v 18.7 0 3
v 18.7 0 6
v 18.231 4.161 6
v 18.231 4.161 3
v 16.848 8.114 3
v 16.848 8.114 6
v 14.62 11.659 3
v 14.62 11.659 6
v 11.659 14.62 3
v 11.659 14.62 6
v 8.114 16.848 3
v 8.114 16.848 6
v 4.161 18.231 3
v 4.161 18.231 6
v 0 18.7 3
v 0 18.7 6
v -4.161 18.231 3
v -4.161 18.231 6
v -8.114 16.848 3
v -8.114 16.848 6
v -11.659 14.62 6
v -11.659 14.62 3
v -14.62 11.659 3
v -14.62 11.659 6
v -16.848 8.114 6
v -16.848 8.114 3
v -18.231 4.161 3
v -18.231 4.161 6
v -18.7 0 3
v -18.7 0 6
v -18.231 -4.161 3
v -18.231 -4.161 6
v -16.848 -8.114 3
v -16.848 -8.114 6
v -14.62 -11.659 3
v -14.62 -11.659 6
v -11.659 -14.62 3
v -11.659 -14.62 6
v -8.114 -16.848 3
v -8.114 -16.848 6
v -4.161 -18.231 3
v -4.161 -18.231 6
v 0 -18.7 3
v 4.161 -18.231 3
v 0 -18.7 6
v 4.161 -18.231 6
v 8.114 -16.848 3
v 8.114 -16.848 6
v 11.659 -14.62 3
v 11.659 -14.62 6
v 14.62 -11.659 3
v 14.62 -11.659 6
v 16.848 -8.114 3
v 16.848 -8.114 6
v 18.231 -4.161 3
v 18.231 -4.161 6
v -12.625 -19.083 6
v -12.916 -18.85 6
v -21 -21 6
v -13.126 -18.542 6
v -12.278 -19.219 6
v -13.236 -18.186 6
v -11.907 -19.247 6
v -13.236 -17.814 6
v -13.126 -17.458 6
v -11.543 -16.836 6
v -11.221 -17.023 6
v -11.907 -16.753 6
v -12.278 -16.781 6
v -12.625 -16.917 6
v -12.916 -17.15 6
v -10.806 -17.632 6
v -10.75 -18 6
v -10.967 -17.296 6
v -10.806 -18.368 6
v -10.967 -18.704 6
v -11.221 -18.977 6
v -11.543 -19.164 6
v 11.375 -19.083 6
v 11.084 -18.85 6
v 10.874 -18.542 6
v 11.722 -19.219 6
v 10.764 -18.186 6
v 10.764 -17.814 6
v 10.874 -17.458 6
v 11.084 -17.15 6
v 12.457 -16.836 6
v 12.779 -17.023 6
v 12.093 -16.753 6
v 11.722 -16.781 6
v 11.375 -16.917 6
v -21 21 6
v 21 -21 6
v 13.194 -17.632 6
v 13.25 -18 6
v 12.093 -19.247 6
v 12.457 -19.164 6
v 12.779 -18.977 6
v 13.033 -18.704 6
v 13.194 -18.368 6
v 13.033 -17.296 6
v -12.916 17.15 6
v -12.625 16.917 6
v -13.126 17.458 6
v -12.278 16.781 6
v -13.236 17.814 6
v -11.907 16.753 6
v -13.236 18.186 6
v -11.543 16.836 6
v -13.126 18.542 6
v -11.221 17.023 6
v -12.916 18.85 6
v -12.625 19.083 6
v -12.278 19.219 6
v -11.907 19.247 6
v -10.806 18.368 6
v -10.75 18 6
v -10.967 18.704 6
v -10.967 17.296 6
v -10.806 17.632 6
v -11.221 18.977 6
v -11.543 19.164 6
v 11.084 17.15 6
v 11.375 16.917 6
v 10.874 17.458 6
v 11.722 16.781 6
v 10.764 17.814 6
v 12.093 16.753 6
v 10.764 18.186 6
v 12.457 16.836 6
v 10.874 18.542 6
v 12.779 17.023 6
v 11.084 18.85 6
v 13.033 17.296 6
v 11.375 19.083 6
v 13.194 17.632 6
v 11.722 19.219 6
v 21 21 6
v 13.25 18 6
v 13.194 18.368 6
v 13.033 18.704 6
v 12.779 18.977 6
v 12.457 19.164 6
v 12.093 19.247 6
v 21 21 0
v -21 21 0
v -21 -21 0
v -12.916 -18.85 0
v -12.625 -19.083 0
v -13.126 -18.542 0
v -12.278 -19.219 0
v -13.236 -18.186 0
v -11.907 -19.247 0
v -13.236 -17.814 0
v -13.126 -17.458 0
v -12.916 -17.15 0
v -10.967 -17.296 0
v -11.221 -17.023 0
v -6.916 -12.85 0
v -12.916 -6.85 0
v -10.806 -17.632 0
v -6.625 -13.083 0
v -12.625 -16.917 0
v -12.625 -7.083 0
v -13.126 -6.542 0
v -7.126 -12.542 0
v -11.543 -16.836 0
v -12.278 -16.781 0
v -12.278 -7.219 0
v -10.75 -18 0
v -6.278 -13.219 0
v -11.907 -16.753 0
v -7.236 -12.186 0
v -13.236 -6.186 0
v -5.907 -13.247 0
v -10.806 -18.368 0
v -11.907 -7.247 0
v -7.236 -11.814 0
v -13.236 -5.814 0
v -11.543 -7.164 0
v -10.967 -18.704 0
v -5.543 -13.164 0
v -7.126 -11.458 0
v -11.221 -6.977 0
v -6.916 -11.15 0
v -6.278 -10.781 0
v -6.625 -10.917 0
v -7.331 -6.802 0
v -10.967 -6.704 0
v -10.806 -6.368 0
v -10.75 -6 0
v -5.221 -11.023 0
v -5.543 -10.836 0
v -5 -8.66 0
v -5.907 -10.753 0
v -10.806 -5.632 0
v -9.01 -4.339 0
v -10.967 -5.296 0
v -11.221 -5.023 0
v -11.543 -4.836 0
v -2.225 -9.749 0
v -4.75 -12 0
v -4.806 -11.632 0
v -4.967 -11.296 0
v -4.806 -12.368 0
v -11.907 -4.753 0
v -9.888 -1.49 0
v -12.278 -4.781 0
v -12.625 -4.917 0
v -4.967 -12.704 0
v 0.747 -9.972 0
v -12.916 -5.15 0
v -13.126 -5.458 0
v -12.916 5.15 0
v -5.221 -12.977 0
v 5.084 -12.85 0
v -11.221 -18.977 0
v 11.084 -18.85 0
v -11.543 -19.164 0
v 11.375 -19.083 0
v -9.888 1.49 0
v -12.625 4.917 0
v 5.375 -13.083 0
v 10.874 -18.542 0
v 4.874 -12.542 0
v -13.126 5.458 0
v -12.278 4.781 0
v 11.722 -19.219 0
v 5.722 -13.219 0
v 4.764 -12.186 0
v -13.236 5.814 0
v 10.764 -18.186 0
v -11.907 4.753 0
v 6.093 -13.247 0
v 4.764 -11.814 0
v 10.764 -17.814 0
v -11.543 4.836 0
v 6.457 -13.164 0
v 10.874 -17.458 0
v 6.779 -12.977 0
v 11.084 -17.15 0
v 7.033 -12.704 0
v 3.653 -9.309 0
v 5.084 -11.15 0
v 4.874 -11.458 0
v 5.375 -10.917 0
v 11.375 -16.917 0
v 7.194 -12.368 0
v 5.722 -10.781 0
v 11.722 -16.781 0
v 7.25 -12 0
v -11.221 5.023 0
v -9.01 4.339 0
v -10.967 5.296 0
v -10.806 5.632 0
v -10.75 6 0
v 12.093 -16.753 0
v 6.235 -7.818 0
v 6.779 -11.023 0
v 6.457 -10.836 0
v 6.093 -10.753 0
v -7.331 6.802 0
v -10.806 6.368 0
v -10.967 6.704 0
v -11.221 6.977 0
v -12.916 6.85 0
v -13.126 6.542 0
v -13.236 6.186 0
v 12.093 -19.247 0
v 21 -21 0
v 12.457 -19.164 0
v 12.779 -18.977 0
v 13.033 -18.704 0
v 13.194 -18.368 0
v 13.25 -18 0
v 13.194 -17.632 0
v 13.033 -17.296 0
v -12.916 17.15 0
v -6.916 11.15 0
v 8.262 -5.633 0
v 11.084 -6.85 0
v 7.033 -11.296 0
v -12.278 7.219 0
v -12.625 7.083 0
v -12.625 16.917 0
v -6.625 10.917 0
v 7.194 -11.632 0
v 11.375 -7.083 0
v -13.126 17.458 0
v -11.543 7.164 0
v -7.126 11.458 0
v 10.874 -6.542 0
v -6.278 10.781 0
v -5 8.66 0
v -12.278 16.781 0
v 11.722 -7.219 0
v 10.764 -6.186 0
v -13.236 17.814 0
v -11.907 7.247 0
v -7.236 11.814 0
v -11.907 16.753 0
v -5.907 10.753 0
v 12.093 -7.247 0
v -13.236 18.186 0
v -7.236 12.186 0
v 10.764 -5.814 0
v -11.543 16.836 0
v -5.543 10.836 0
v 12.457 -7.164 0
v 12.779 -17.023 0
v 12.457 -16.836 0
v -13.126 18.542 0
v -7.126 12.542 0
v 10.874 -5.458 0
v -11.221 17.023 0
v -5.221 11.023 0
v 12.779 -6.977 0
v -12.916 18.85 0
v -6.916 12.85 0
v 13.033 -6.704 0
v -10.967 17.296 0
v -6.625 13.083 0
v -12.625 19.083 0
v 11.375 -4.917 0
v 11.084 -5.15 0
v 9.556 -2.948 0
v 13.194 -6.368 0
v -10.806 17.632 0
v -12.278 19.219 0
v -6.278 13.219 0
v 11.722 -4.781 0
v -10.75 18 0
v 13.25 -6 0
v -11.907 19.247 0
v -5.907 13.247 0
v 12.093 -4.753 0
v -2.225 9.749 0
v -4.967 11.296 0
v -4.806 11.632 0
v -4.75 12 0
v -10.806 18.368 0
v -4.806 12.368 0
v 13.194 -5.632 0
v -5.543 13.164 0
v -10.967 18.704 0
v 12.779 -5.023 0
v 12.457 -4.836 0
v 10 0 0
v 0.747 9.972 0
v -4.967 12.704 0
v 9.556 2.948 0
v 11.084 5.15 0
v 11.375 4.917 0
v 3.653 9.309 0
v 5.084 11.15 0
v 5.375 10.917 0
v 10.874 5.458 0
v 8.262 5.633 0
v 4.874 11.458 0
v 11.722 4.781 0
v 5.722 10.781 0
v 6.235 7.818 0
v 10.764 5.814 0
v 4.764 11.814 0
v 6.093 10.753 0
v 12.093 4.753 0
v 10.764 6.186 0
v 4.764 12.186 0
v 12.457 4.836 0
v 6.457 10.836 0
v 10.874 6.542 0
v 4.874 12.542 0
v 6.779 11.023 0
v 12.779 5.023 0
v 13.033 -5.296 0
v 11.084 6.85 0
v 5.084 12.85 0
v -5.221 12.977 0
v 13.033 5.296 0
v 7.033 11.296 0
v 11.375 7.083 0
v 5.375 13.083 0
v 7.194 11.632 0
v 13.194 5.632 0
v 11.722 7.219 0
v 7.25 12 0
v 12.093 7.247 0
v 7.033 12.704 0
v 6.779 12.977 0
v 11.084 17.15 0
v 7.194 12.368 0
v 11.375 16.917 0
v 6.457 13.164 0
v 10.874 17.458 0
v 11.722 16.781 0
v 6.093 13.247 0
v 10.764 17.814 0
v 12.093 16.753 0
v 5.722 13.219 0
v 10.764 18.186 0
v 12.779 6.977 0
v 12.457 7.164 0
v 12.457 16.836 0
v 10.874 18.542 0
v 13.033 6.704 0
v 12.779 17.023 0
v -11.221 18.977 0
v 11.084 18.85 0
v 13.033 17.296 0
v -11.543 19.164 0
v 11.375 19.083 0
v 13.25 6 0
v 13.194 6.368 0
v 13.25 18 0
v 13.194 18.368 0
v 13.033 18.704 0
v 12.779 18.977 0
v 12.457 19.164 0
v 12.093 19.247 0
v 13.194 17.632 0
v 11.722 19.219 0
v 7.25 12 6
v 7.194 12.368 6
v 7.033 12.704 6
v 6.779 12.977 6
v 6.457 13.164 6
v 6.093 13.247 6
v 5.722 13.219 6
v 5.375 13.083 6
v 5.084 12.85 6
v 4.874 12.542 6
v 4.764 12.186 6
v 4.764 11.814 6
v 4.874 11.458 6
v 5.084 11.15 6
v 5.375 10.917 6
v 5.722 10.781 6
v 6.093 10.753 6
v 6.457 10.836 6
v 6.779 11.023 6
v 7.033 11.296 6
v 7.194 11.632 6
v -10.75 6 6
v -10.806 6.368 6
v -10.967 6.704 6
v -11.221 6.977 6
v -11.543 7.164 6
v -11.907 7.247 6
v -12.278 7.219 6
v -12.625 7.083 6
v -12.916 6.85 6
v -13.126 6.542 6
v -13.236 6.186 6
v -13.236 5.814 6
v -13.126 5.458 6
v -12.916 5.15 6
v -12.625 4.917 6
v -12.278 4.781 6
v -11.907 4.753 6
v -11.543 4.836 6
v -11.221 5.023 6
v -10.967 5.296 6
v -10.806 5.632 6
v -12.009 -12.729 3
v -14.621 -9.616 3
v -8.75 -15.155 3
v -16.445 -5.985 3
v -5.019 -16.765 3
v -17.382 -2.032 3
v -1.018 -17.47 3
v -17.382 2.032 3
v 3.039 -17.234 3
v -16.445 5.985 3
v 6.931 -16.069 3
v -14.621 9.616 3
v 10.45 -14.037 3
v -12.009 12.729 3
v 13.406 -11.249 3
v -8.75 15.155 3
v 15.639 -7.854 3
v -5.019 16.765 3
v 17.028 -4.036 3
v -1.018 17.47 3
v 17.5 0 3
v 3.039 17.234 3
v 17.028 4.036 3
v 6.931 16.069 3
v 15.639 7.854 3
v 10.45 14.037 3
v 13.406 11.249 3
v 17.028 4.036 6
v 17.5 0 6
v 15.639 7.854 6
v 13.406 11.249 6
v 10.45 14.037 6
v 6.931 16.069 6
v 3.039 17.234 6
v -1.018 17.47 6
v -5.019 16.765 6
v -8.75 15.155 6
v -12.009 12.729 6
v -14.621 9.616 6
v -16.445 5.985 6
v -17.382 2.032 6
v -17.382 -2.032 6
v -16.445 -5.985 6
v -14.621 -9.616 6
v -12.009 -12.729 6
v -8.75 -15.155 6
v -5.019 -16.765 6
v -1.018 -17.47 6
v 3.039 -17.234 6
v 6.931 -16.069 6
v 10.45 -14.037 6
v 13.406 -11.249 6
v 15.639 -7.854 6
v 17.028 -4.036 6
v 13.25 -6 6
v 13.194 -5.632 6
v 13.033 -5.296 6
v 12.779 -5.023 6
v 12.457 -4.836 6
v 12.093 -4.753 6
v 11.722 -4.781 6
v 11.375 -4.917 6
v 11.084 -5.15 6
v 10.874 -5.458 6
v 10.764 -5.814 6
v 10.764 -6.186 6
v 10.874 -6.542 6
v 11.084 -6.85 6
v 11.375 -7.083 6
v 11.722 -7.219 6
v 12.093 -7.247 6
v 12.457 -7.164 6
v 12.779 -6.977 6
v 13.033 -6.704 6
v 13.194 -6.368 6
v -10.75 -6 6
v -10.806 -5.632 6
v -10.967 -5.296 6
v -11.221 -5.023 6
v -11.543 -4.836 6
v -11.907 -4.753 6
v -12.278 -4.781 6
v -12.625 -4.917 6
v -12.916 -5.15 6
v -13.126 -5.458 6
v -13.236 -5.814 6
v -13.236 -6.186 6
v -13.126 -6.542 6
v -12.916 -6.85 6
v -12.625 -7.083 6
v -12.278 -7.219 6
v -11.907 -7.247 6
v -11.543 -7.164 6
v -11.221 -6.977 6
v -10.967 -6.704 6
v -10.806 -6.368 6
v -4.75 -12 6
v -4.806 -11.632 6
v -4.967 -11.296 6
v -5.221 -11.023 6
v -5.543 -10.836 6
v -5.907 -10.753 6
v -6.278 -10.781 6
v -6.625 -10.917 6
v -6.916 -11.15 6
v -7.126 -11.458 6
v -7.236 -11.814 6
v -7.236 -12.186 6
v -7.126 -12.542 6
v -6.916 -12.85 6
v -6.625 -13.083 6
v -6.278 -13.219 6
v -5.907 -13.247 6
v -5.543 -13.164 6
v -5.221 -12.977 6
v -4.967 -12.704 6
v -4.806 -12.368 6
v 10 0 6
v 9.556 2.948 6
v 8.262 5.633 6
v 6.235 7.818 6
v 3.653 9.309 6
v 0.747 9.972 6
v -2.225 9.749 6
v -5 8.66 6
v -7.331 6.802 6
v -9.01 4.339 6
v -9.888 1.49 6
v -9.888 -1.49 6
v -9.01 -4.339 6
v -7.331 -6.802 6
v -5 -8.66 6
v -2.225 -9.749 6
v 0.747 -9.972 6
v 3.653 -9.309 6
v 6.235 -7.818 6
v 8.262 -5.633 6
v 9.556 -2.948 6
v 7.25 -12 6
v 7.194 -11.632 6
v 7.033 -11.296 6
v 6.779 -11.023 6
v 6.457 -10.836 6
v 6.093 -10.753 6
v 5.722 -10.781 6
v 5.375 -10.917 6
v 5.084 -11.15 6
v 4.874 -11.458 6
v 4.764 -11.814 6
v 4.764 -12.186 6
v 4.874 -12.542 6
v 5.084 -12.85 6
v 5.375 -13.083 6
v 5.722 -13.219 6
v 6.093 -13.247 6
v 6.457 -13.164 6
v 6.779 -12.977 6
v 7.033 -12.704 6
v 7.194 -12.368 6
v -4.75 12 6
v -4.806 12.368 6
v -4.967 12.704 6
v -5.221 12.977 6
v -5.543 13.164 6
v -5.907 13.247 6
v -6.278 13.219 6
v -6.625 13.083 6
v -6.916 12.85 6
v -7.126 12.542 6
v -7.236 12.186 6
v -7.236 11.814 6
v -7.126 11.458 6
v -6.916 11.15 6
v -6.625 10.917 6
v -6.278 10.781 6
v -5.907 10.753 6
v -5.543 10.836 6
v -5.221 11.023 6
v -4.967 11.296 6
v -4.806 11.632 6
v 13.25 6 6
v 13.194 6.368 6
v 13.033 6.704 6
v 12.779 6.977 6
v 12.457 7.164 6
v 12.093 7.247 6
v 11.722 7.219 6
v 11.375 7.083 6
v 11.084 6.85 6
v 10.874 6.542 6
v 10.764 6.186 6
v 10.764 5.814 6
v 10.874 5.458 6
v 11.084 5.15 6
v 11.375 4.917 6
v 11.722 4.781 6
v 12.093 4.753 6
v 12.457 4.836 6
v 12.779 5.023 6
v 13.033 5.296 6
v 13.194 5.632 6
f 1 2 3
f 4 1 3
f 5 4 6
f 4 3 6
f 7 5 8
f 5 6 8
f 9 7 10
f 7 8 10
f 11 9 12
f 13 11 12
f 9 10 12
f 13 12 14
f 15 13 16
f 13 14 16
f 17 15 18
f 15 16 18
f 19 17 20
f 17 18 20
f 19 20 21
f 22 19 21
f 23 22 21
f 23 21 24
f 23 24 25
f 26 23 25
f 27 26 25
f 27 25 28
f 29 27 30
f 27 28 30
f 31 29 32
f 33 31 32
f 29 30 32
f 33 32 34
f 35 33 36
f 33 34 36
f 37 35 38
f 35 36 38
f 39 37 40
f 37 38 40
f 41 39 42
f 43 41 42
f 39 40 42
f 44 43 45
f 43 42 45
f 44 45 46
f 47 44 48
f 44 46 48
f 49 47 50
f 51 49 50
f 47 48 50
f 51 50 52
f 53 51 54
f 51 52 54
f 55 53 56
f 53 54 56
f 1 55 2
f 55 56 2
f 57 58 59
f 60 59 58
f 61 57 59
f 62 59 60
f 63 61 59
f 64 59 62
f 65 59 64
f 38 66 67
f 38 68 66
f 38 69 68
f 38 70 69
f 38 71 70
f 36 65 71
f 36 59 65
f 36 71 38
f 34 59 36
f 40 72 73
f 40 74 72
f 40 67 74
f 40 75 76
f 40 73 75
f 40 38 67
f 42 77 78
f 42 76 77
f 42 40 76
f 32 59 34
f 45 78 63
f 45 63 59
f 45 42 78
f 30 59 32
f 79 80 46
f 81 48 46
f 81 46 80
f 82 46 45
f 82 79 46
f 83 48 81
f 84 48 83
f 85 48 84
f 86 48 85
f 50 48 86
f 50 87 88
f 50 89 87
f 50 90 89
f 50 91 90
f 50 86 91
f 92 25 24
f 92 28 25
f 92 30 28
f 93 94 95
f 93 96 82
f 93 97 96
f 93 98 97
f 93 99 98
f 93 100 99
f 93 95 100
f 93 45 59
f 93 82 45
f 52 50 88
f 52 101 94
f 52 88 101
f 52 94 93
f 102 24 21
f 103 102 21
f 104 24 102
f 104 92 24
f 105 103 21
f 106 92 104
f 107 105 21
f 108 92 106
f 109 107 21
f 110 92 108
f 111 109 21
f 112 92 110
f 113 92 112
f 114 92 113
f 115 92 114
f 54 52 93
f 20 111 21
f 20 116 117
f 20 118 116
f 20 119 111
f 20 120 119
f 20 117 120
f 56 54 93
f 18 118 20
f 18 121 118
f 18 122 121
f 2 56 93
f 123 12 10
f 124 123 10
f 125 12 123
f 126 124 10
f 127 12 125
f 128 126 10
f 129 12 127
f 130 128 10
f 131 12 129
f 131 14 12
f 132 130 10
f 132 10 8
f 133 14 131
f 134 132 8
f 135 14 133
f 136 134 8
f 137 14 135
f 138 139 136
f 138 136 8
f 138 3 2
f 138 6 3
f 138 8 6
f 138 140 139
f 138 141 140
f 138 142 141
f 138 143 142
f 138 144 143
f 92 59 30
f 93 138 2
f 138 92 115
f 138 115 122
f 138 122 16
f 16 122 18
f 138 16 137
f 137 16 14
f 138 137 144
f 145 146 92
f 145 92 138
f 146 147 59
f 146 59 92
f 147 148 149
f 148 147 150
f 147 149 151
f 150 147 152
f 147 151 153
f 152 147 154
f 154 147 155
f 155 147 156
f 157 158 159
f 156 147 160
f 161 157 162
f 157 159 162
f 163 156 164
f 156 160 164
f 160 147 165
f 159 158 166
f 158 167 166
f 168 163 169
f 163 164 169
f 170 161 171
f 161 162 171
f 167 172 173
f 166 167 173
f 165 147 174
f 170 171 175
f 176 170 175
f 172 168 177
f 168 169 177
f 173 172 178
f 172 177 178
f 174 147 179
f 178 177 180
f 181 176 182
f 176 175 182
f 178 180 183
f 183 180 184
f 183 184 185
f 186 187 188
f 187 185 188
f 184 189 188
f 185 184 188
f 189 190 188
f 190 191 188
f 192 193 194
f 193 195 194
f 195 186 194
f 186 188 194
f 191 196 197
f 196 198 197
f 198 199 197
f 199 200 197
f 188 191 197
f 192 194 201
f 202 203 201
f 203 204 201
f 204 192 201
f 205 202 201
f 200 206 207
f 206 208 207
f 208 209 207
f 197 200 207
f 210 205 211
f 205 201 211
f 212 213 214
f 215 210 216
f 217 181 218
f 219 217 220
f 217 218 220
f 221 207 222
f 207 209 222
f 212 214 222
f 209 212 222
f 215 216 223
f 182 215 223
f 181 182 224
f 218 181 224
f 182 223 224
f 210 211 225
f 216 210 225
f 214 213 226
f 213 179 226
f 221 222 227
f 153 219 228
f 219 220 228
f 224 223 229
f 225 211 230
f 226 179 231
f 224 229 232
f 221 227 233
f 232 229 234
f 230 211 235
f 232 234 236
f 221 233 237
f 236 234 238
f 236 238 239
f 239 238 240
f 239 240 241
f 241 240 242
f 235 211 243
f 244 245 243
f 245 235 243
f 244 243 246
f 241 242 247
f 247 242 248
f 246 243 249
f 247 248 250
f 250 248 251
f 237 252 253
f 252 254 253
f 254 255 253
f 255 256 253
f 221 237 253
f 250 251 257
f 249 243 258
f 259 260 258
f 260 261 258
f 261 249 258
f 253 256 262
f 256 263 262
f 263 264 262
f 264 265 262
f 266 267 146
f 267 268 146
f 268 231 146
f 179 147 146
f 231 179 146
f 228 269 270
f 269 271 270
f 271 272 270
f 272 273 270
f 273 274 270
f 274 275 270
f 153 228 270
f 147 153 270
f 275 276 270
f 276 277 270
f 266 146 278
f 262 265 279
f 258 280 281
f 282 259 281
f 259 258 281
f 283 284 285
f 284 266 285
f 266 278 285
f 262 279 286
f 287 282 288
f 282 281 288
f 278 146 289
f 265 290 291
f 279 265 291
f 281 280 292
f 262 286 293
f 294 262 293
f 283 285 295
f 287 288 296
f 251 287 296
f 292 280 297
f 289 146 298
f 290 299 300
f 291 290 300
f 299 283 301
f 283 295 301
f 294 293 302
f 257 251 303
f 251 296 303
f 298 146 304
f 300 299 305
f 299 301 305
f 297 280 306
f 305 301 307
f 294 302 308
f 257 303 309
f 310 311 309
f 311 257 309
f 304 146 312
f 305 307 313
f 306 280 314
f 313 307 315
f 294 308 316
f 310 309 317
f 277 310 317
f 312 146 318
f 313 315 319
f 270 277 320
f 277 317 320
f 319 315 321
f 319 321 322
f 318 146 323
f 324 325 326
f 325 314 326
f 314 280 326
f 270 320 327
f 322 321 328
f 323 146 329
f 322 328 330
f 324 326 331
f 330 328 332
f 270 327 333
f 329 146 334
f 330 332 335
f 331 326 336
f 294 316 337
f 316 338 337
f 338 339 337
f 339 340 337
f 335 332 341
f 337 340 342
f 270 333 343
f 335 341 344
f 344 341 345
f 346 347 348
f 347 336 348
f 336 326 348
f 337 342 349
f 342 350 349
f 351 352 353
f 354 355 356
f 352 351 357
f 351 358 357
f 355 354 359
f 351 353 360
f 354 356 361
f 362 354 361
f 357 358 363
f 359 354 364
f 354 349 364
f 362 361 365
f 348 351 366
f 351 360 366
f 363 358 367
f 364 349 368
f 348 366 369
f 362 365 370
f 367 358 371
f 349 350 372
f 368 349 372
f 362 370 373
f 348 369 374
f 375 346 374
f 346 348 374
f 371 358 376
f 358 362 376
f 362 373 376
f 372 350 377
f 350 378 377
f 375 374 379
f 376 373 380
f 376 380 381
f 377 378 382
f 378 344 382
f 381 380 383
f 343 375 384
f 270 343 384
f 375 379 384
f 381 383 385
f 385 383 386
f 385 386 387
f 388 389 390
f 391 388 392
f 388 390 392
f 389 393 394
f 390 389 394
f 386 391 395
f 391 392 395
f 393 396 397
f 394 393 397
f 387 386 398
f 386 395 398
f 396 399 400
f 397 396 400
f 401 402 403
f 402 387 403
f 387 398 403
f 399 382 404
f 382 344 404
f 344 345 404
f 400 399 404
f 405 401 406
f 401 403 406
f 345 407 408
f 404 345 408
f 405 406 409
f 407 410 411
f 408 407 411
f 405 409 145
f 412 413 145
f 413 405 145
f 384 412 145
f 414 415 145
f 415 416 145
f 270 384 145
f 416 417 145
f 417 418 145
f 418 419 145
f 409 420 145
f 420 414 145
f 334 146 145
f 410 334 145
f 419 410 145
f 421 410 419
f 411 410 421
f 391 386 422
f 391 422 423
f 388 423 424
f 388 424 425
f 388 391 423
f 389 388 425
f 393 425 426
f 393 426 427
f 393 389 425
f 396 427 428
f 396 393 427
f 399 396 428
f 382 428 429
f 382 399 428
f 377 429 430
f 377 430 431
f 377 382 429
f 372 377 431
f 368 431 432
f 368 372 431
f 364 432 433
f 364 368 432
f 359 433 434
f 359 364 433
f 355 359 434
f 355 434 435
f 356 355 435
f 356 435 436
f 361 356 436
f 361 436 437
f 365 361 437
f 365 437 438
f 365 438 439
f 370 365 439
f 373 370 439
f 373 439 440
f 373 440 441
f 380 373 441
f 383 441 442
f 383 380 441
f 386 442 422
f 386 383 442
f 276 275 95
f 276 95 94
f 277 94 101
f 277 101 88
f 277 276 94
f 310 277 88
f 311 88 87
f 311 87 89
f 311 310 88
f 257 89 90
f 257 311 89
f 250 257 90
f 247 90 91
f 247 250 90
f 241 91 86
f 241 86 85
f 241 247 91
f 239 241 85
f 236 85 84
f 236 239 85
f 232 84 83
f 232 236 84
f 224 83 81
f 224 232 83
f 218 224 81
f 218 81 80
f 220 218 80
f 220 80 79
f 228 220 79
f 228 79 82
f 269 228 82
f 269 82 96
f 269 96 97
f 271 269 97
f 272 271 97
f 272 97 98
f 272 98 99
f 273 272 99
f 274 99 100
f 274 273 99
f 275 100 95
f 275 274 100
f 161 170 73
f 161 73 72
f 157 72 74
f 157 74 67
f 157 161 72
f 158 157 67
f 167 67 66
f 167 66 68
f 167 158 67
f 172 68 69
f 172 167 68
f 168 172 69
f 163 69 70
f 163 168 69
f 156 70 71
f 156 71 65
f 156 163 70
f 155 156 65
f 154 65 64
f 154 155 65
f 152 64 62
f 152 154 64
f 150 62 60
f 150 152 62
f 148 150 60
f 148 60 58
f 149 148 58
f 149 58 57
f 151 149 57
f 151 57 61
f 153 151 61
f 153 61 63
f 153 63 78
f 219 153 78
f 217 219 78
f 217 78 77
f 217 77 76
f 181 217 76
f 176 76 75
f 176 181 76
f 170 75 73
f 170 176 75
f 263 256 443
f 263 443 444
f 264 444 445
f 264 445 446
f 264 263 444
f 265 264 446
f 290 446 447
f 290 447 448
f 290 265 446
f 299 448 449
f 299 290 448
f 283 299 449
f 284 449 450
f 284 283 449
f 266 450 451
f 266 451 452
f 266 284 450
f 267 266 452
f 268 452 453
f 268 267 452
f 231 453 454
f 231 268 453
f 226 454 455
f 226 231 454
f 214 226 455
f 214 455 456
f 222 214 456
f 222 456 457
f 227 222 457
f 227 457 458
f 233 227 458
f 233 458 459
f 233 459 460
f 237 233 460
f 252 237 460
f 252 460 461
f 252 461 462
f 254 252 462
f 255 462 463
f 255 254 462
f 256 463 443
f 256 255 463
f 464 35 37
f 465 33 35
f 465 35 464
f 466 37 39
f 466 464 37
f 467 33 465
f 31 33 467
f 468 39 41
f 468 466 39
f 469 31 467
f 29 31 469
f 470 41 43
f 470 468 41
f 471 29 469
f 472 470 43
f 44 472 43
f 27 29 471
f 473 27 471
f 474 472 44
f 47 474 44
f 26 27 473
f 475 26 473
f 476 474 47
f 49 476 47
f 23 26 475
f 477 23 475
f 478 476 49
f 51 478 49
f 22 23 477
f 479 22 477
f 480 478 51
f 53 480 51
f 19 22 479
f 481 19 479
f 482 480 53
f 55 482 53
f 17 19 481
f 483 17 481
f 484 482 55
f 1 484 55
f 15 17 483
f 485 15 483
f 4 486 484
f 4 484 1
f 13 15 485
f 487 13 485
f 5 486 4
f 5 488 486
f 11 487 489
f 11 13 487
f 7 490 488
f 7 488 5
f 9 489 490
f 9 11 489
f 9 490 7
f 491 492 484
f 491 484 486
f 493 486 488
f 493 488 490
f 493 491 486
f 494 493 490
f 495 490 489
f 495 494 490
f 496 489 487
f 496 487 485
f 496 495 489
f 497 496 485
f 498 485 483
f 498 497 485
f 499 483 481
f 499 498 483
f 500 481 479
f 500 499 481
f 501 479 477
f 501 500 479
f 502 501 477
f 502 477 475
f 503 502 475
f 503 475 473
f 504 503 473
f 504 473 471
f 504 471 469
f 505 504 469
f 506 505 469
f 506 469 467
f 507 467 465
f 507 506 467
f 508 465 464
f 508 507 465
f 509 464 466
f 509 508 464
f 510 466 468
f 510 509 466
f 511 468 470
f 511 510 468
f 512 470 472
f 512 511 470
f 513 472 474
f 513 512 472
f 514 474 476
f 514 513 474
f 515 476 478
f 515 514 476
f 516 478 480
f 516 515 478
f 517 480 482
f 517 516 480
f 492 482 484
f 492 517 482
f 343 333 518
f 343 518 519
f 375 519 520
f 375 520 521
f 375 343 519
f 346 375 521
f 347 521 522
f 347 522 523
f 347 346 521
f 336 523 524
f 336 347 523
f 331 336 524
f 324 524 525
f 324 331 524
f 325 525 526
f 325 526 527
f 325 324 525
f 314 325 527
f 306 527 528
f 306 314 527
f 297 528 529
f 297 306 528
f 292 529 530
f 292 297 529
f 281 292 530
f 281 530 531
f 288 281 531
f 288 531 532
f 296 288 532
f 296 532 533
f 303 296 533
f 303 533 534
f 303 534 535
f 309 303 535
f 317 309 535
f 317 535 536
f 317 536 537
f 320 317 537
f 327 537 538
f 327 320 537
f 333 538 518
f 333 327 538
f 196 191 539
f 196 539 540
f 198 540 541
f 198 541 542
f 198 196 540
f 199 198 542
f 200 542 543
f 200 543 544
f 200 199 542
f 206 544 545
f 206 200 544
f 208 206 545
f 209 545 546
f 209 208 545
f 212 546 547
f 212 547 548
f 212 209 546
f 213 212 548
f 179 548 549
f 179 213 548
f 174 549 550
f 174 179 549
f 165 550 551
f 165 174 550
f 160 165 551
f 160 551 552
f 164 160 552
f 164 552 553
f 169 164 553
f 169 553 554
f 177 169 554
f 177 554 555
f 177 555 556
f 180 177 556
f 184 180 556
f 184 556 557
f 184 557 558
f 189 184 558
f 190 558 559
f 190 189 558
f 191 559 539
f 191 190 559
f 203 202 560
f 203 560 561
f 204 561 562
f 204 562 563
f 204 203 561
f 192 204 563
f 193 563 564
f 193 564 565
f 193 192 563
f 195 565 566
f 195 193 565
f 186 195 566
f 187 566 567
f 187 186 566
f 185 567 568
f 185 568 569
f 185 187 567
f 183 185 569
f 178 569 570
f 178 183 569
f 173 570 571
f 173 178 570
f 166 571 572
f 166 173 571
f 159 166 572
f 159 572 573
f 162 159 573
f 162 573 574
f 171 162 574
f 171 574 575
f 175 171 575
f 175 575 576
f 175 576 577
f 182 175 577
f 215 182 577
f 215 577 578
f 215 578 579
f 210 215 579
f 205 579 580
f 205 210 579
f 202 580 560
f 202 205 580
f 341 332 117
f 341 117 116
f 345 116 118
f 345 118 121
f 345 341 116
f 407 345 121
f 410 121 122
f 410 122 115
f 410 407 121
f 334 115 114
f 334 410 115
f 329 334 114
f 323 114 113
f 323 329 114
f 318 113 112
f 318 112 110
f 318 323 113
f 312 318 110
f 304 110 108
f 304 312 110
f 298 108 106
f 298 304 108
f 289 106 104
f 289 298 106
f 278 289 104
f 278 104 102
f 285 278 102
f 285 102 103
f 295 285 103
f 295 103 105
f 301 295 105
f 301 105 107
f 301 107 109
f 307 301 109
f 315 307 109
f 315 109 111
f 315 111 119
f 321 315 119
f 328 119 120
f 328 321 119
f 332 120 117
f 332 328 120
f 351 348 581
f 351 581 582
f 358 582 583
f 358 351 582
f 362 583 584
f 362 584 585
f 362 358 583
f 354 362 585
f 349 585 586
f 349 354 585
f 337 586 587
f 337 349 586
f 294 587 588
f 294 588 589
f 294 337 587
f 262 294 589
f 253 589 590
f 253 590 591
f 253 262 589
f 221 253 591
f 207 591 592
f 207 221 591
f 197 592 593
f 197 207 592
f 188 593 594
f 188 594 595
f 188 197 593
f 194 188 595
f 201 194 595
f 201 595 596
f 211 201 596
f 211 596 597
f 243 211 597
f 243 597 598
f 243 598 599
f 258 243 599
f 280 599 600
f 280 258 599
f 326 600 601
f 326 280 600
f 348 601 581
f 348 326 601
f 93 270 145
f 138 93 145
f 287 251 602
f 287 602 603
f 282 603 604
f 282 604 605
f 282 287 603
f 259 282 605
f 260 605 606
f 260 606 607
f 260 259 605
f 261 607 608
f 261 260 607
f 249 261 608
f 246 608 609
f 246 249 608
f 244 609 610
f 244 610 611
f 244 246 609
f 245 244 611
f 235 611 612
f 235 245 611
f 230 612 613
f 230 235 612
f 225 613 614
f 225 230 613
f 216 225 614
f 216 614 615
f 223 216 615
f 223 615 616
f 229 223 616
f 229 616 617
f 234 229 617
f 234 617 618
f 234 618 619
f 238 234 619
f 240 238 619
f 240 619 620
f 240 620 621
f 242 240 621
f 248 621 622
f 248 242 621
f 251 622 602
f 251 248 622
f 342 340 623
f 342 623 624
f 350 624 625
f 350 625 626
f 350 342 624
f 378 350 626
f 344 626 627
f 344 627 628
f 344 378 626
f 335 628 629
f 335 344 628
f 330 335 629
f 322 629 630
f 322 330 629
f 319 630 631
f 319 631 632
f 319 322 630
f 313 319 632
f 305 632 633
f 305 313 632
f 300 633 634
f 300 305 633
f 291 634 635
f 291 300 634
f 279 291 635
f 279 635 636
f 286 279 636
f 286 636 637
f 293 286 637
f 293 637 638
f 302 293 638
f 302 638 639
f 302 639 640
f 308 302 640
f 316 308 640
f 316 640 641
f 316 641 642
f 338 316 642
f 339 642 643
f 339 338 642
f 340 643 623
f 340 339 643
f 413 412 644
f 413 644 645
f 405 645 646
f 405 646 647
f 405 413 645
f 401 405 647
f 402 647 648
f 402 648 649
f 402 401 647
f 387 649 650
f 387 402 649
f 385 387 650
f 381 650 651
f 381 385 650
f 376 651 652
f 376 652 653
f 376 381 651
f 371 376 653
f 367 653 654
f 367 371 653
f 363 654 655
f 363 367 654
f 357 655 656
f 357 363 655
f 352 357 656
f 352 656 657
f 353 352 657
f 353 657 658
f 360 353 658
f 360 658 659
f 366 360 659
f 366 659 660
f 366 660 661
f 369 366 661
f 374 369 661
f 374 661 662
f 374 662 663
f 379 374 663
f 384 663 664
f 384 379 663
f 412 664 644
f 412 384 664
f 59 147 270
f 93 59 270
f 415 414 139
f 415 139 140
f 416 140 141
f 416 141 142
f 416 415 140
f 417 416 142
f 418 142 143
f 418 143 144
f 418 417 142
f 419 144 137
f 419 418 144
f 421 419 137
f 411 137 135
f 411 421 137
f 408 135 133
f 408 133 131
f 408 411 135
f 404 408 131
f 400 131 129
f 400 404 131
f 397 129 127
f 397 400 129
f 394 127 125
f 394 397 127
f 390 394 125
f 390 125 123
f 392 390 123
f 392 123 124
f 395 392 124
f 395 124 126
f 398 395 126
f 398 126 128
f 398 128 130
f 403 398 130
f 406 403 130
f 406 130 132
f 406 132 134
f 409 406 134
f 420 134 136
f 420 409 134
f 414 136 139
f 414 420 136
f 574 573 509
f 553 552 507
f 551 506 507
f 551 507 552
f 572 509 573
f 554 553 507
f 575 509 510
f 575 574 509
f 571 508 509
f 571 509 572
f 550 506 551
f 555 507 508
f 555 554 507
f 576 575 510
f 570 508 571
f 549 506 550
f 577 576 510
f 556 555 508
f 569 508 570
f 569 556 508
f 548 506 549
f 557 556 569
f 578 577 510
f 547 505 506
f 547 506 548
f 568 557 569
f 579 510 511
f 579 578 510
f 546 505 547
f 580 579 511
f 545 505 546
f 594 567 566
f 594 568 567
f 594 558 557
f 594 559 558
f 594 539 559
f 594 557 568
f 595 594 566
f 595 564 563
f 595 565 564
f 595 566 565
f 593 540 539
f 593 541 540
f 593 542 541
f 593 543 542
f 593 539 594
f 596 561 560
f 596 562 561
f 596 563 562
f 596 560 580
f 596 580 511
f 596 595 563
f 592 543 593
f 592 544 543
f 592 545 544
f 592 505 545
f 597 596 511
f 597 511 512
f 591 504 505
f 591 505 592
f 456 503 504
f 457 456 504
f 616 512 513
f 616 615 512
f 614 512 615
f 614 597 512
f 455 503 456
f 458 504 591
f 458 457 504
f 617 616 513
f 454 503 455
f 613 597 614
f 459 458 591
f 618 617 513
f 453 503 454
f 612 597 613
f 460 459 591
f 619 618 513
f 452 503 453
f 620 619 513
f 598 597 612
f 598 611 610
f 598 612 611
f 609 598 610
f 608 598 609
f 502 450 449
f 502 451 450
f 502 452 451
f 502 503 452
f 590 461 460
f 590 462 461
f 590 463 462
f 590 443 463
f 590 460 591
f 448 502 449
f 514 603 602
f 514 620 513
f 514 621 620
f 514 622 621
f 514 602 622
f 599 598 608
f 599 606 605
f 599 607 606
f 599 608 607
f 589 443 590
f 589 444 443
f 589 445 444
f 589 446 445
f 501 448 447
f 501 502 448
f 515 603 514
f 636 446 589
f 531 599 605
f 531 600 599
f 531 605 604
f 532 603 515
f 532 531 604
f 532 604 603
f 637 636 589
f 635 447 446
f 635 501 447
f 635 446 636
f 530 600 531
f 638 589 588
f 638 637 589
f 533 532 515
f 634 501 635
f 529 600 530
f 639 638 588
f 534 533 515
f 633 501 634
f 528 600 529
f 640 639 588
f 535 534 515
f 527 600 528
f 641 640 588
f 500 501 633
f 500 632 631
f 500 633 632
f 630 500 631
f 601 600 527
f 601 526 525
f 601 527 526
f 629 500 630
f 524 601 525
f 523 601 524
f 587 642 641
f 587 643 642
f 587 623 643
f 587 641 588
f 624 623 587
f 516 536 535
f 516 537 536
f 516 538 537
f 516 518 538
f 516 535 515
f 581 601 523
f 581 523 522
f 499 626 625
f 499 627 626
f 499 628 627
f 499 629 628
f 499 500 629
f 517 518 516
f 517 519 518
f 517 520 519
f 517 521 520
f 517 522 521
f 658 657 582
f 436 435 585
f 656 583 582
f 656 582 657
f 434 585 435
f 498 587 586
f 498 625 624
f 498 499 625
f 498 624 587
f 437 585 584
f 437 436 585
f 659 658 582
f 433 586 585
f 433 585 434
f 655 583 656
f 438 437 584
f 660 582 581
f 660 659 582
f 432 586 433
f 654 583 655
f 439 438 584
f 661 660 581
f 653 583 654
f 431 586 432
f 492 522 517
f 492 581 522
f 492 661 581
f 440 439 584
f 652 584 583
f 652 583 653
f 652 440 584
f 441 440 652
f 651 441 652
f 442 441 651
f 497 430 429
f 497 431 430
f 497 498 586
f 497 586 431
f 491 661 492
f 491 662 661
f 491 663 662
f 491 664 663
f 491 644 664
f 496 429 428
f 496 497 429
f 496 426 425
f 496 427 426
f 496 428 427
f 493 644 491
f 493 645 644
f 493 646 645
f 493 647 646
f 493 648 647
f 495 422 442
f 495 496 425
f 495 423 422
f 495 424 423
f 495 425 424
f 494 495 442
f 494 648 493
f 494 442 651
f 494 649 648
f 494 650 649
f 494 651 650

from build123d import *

# Parameters (mm, degrees)
SKETCH_1_W          = 42
SKETCH_1_H          = 42
SKETCH_1_R          = 1.25
SKETCH_1_R_2        = 10
EXTRUDE_1_DEPTH     = 6
SKETCH_2_R          = 18.7
SKETCH_2_R_2        = 17.5
CUT_EXTRUDE_1_DEPTH = 3


with BuildPart() as part:
    # 草圖1 → 填料-伸長1 (new body)
    with BuildSketch(Plane.XY):
        Rectangle(SKETCH_1_W, SKETCH_1_H)
        with Locations((-6, 12)):
            Circle(SKETCH_1_R, mode=Mode.SUBTRACT)
        with Locations((-12, 6)):
            Circle(SKETCH_1_R, mode=Mode.SUBTRACT)
        with Locations((-12, -6)):
            Circle(SKETCH_1_R, mode=Mode.SUBTRACT)
        with Locations((-6, -12)):
            Circle(SKETCH_1_R, mode=Mode.SUBTRACT)
        with Locations((6, 12)):
            Circle(SKETCH_1_R, mode=Mode.SUBTRACT)
        with Locations((12, 6)):
            Circle(SKETCH_1_R, mode=Mode.SUBTRACT)
        with Locations((12, -6)):
            Circle(SKETCH_1_R, mode=Mode.SUBTRACT)
        with Locations((6, -12)):
            Circle(SKETCH_1_R, mode=Mode.SUBTRACT)
        with Locations((-12, 18)):
            Circle(SKETCH_1_R, mode=Mode.SUBTRACT)
        with Locations((12, 18)):
            Circle(SKETCH_1_R, mode=Mode.SUBTRACT)
        with Locations((-12, -18)):
            Circle(SKETCH_1_R, mode=Mode.SUBTRACT)
        with Locations((12, -18)):
            Circle(SKETCH_1_R, mode=Mode.SUBTRACT)
        Circle(SKETCH_1_R_2, mode=Mode.SUBTRACT)
    extrude(amount=EXTRUDE_1_DEPTH)

    # 草圖2 → 除料-伸長1 (cut)
    with BuildSketch(Plane.XY.offset(6)):
        Circle(SKETCH_2_R)
        Circle(SKETCH_2_R_2, mode=Mode.SUBTRACT)
    extrude(amount=-CUT_EXTRUDE_1_DEPTH, mode=Mode.SUBTRACT)


solid = part.part
